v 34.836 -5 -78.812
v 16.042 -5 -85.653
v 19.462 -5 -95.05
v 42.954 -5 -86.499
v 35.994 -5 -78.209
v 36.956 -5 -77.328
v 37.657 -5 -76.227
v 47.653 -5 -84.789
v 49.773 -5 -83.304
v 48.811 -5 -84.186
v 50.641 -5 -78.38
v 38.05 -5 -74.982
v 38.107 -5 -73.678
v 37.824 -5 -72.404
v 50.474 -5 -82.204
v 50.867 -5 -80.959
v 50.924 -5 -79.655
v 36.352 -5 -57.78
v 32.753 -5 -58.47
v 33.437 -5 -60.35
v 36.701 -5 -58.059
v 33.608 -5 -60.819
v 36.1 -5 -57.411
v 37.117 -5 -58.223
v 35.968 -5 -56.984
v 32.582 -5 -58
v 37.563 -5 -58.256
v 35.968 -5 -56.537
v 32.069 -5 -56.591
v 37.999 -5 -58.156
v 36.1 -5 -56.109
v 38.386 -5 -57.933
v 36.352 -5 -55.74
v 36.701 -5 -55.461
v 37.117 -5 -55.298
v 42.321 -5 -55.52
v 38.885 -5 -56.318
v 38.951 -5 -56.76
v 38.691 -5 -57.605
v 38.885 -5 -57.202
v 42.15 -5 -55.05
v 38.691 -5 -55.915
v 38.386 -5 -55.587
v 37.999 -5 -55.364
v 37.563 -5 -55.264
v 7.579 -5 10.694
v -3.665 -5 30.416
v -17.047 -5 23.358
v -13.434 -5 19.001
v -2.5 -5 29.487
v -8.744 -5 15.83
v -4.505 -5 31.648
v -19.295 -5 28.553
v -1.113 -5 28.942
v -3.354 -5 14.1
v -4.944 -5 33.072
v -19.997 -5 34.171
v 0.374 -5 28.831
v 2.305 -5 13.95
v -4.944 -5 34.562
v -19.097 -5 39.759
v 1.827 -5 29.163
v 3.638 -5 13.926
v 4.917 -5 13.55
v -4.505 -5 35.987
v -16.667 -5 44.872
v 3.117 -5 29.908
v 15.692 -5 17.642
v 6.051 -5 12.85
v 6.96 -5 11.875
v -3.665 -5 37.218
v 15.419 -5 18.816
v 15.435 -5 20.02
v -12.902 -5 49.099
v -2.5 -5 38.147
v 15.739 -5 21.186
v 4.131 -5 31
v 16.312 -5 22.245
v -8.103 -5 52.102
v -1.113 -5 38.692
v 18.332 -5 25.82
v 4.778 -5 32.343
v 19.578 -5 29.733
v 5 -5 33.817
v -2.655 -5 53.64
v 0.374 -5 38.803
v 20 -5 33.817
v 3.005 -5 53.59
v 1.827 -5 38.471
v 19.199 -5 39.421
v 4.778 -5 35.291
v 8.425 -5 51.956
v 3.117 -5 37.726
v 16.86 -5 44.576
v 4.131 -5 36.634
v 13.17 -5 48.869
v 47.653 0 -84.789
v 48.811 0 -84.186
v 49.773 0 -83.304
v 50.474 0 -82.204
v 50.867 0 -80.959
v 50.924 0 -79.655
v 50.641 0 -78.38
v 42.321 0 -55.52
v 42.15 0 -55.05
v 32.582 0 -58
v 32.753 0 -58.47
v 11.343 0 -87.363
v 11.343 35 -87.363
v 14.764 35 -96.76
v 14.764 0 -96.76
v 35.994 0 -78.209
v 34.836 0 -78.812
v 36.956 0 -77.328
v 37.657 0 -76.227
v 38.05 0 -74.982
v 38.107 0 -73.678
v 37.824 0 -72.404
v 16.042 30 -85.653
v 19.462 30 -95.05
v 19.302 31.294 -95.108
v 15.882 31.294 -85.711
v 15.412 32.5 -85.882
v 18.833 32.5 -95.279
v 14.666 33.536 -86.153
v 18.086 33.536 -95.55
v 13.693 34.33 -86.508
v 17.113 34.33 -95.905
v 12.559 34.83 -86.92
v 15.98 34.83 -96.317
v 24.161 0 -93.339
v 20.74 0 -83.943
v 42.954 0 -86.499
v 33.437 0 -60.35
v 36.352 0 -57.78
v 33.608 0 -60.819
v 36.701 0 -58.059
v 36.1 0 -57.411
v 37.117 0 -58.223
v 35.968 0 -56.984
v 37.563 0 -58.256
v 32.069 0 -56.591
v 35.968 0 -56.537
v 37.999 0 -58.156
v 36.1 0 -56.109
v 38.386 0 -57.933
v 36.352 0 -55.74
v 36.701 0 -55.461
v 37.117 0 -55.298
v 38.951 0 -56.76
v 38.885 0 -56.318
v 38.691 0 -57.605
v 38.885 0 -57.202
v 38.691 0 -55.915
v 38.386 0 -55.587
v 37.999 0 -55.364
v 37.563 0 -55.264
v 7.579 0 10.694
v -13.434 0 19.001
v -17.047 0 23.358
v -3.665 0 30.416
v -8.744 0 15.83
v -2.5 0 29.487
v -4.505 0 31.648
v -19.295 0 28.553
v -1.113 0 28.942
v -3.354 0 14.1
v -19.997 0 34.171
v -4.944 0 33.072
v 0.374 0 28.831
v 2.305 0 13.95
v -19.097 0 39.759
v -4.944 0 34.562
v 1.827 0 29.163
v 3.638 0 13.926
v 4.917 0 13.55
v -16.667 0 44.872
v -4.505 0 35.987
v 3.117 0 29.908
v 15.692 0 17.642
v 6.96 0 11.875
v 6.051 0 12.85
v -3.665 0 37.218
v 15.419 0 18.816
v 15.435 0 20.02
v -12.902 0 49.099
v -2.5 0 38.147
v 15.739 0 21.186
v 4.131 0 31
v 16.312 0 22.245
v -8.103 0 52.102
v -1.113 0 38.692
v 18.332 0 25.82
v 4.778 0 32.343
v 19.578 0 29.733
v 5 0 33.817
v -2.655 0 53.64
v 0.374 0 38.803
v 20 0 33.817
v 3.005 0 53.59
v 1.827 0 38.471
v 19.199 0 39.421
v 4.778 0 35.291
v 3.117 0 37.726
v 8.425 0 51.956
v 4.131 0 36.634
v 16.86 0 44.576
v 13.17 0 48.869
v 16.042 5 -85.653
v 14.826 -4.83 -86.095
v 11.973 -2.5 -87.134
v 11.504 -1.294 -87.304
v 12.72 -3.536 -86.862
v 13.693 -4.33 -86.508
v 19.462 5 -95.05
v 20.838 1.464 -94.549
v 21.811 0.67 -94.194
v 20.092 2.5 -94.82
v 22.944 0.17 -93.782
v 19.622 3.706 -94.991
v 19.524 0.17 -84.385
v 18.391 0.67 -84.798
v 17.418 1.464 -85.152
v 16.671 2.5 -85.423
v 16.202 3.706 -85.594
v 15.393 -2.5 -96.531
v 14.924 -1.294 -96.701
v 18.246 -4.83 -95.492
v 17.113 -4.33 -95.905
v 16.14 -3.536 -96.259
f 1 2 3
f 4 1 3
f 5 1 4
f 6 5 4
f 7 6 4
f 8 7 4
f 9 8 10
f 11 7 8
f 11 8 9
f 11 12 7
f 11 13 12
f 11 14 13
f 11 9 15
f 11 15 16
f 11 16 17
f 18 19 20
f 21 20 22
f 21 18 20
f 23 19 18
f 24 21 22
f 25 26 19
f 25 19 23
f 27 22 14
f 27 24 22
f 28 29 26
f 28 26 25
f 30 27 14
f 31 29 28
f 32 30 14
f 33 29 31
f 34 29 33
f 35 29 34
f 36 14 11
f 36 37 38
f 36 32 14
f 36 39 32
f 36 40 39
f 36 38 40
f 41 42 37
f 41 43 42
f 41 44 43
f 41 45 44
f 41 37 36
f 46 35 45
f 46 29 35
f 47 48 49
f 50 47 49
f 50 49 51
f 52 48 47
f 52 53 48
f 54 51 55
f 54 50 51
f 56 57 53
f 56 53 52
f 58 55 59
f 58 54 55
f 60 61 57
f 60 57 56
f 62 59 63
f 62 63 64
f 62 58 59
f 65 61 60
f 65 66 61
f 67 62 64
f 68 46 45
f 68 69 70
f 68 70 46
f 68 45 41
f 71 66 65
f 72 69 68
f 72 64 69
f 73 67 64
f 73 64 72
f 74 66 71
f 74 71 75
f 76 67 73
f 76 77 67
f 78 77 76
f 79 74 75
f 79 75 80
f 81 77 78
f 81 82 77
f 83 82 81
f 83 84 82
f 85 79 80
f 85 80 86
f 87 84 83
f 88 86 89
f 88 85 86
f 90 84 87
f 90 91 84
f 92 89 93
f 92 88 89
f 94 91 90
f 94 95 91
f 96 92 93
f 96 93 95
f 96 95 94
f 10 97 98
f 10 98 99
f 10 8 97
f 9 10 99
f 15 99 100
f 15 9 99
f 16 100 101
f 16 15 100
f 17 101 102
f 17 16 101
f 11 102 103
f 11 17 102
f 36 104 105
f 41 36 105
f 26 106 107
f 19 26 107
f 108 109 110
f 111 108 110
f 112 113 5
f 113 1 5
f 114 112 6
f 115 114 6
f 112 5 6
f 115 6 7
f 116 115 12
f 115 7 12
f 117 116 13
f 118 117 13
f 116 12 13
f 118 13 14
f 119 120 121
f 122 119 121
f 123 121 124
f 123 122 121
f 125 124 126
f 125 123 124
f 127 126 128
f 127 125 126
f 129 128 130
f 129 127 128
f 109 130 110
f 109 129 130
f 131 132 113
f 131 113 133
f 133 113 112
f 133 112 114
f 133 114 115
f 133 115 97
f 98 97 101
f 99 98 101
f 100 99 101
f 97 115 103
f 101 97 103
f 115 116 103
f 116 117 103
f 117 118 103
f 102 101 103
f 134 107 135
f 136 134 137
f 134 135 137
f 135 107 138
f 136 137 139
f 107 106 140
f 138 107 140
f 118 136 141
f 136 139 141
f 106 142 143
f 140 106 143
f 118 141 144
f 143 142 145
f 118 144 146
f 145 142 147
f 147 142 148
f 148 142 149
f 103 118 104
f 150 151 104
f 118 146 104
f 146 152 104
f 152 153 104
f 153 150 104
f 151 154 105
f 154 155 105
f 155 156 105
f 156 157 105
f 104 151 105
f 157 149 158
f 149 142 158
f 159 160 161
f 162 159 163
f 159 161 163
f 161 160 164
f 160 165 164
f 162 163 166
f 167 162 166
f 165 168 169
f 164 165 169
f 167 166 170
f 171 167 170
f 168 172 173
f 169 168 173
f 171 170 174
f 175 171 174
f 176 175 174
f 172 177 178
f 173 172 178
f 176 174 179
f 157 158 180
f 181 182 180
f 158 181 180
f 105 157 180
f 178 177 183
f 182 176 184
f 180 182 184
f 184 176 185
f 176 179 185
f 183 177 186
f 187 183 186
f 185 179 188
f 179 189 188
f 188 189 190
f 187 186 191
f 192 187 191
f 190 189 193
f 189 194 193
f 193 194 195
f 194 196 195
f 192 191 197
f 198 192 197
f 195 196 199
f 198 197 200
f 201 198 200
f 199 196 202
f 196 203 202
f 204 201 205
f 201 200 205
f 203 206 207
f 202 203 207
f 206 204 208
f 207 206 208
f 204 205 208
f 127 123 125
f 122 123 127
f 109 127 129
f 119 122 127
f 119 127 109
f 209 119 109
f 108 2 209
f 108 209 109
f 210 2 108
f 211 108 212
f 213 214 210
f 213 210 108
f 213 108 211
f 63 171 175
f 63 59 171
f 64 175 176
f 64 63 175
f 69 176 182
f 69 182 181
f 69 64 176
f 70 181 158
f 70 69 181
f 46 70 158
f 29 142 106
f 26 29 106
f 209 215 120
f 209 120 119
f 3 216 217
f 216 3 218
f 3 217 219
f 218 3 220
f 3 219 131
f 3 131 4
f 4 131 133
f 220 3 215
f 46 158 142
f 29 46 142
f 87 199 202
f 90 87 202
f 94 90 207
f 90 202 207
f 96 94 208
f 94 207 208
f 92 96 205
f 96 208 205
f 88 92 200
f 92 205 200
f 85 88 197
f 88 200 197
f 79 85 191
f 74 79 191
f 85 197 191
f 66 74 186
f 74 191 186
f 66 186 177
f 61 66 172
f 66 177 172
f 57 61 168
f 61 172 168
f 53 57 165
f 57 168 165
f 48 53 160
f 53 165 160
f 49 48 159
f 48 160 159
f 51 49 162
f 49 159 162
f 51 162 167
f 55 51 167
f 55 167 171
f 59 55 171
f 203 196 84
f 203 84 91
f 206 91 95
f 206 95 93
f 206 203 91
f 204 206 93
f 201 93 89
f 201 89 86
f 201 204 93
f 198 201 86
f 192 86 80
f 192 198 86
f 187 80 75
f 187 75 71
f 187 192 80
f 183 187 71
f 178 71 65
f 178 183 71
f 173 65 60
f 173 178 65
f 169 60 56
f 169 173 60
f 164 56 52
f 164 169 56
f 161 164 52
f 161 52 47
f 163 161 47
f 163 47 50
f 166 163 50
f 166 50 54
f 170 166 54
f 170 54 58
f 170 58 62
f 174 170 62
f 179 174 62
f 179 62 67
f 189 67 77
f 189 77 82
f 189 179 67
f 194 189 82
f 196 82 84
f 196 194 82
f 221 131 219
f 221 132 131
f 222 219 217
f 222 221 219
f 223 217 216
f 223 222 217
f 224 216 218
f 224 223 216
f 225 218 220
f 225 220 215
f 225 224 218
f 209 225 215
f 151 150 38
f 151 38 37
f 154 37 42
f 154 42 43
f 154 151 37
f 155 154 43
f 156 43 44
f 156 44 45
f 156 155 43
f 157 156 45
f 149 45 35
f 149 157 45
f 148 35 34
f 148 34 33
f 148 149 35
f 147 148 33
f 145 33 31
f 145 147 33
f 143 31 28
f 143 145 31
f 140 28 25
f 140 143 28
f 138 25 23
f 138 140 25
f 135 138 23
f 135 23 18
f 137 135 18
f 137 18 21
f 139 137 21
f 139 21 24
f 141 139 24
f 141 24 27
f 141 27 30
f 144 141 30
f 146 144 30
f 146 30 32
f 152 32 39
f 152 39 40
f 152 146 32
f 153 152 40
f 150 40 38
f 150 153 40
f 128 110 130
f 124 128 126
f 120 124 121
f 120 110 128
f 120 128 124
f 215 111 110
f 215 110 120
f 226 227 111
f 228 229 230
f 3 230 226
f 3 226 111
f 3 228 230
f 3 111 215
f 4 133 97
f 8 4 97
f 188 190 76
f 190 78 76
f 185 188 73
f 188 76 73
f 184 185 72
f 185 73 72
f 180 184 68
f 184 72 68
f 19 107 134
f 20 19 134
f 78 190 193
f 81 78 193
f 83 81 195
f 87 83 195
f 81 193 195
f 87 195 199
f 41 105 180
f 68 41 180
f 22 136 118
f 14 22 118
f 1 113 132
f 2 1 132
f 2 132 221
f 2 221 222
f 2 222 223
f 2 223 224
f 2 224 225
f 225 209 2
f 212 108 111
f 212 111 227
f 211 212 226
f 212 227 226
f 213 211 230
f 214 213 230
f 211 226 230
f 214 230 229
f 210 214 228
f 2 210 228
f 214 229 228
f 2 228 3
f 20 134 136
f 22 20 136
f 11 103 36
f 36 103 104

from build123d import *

# Parameters (mm, degrees)
F0_R     = 5
F0_R_2   = 1.5
F1_DEPTH = 5
F2_DEPTH = 35
F3_R     = 4.99999


# Not quite as in the source:
# - a fillet or chamfer is up to 0.001 mm smaller than in the source, because OpenCascade refuses the exact size


with BuildPart() as f1:
    # F0 (on Front) → F1 (new body)
    with BuildSketch(Plane.XZ):
        with BuildLine():
            ThreePointArc((14.7291057085, 20.287369527), (18.6357467541, 26.5570015397), (20, 33.8170940264))
            ThreePointArc((20, 33.8170940264), (-16.154238453, 45.6086409989), (6.0959419995, 14.7687478741))
            ThreePointArc((6.0959419995, 14.7687478741), (10.7719287617, 16.9658166044), (14.7291057085, 20.287369527))
        make_face()
        with Locations((0, 33.8170940264)):
            Circle(F0_R, mode=Mode.SUBTRACT)
        with BuildLine():
            ThreePointArc((14.7291057085, 20.287369527), (10.7719287617, 16.9658166044), (6.0959419995, 14.7687478741))
            Line((6.0959419995, 14.7687478741), (32.0687023036, -56.5908245822))
            Line((32.0687023036, -56.5908245822), (32.4609528428, -56.4480570615))
            ThreePointArc((32.4609528428, -56.4480570615), (36.7371185385, -51.8113638587), (42.1496687351, -55.0500082175))
            Line((42.1496687351, -55.0500082175), (14.7291057085, 20.287369527))
        make_face()
        with BuildLine():
            Line((32.4609528428, -56.4480570615), (32.0687023036, -56.5908245822))
            Line((32.0687023036, -56.5908245822), (32.5817325186, -58.0003635134))
            Line((32.5817325186, -58.0003635134), (32.7527425708, -58.4702097705))
            ThreePointArc((32.7527425708, -58.4702097705), (32.5024604285, -57.4741961437), (32.4609528428, -56.4480570615))
        make_face()
        with BuildLine():
            ThreePointArc((33.8290334161, -60.2068275447), (33.2012405538, -59.3940787929), (32.7527425708, -58.4702097705))
            Line((32.7527425708, -58.4702097705), (33.4367828769, -60.3495950653))
            Line((33.4367828769, -60.3495950653), (33.8290334161, -60.2068275447))
        make_face()
        with BuildLine():
            ThreePointArc((42.4512056942, -56.7601091071), (42.3752444432, -55.8918681281), (42.1496687351, -55.0500082175))
            ThreePointArc((42.1496687351, -55.0500082175), (36.7371185385, -51.8113638587), (32.4609528428, -56.4480570615))
            ThreePointArc((32.4609528428, -56.4480570615), (32.5024604285, -57.4741961437), (32.7527425708, -58.4702097705))
            ThreePointArc((32.7527425708, -58.4702097705), (33.2012405538, -59.3940787929), (33.8290334161, -60.2068275447))
            ThreePointArc((33.8290334161, -60.2068275447), (39.3071607865, -61.4028917528), (42.4512056942, -56.7601091071))
        make_face()
        with Locations((37.4512056942, -56.7601091071)):
            Circle(F0_R_2, mode=Mode.SUBTRACT)
        with BuildLine():
            Line((42.3206788698, -55.5198547009), (42.1496687351, -55.0500082175))
            ThreePointArc((42.1496687351, -55.0500082175), (42.3752444432, -55.8918681281), (42.4512056942, -56.7601091071))
            ThreePointArc((42.4512056942, -56.7601091071), (39.3071607865, -61.4028917528), (33.8290334161, -60.2068275447))
            Line((33.8290334161, -60.2068275447), (33.4367828769, -60.3495950653))
            Line((33.4367828769, -60.3495950653), (33.6077929485, -60.8194413757))
            Line((33.6077929485, -60.8194413757), (39.5341938332, -77.1020939848))
            Line((39.5341938332, -77.1020939848), (42.9543952664, -86.4990201927))
            Line((42.9543952664, -86.4990201927), (52.3513214743, -83.0788187594))
            Line((52.3513214743, -83.0788187594), (42.3206788698, -55.5198547009))
        make_face()
        Polygon((19.4620797468, -95.0495237758), (42.9543952664, -86.4990201927), (39.5341938332, -77.1020939848), (16.0418783135, -85.652597568), align=None)
        Polygon((14.7636166428, -96.7596244924), (19.4620797468, -95.0495237758), (16.0418783135, -85.652597568), (11.3434152096, -87.3626982846), align=None)
    extrude(amount=F1_DEPTH)

    # F0 (on Front) → F2 (join)
    with BuildSketch(Plane.XZ):
        Polygon((14.7636166428, -96.7596244924), (19.4620797468, -95.0495237758), (16.0418783135, -85.652597568), (11.3434152096, -87.3626982846), align=None)
    extrude(amount=-F2_DEPTH)

    # F3 (radius 5 in the source; OpenCascade refuses exactly that, so slightly less here)
    f3_edges = [f1.edges().sort_by_distance(p)[0] for p in [
        (6.095942, -2.5, 14.768748),
        (14.729106, -2.5, 20.28737),
        (52.351321, -2.5, -83.078819),
        (17.751979, 0, -90.351061),
        (13.053516, -5, -92.061161),
        (39.534194, -2.5, -77.102094),
        (17.751979, 35, -90.351061),
    ]]
    fillet(f3_edges, radius=F3_R)


solid = f1.part
